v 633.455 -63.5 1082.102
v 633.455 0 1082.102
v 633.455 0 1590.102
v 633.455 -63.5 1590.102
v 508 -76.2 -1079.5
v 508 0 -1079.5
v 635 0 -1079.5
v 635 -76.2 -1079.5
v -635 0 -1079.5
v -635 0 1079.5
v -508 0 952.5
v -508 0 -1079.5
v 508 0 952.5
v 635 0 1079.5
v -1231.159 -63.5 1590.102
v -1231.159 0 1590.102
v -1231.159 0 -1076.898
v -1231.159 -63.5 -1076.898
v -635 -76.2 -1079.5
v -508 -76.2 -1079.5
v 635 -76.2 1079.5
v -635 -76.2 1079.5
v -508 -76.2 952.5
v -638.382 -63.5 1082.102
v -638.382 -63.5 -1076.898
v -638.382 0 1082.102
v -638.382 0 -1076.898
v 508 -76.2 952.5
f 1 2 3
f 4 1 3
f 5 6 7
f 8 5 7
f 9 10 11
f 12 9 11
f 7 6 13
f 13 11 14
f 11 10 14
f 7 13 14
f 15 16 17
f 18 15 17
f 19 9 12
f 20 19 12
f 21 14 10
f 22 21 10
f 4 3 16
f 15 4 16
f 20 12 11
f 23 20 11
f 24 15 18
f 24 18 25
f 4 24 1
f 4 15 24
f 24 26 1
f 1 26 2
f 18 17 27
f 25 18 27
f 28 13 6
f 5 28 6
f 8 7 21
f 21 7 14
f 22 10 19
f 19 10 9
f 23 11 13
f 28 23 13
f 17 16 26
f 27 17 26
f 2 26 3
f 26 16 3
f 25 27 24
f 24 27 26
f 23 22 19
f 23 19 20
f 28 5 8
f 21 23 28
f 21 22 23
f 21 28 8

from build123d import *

# Parameters (mm, degrees)
F1_DEPTH = 76.2
F2_W     = 592.77684
F2_H     = 2159
F3_DEPTH = 63.5


with BuildPart() as f1:
    # F0 (on Front) → F1 (new body)
    with BuildSketch(Plane.XZ):
        Polygon((635, 1079.5), (-635, 1079.5), (-635, -1079.5), (-508, -1079.5), (-508, 952.5), (508, 952.5), (508, -1079.5), (635, -1079.5), align=None)
    extrude(amount=F1_DEPTH)


with BuildPart() as f3:
    # F2 (on Front) → F3 (new body)
    with BuildSketch(Plane.XZ):
        Polygon((-638.381676, 1082.102463), (633.454582, 1082.102463), (633.454582, 1590.102463), (-1231.158516, 1590.102463), (-1231.158516, 1082.102463), align=None)
        with Locations((-934.770096, 2.602463)):
            Rectangle(F2_W, F2_H)
    extrude(amount=F3_DEPTH)


solid = Compound([f1.part, f3.part])
